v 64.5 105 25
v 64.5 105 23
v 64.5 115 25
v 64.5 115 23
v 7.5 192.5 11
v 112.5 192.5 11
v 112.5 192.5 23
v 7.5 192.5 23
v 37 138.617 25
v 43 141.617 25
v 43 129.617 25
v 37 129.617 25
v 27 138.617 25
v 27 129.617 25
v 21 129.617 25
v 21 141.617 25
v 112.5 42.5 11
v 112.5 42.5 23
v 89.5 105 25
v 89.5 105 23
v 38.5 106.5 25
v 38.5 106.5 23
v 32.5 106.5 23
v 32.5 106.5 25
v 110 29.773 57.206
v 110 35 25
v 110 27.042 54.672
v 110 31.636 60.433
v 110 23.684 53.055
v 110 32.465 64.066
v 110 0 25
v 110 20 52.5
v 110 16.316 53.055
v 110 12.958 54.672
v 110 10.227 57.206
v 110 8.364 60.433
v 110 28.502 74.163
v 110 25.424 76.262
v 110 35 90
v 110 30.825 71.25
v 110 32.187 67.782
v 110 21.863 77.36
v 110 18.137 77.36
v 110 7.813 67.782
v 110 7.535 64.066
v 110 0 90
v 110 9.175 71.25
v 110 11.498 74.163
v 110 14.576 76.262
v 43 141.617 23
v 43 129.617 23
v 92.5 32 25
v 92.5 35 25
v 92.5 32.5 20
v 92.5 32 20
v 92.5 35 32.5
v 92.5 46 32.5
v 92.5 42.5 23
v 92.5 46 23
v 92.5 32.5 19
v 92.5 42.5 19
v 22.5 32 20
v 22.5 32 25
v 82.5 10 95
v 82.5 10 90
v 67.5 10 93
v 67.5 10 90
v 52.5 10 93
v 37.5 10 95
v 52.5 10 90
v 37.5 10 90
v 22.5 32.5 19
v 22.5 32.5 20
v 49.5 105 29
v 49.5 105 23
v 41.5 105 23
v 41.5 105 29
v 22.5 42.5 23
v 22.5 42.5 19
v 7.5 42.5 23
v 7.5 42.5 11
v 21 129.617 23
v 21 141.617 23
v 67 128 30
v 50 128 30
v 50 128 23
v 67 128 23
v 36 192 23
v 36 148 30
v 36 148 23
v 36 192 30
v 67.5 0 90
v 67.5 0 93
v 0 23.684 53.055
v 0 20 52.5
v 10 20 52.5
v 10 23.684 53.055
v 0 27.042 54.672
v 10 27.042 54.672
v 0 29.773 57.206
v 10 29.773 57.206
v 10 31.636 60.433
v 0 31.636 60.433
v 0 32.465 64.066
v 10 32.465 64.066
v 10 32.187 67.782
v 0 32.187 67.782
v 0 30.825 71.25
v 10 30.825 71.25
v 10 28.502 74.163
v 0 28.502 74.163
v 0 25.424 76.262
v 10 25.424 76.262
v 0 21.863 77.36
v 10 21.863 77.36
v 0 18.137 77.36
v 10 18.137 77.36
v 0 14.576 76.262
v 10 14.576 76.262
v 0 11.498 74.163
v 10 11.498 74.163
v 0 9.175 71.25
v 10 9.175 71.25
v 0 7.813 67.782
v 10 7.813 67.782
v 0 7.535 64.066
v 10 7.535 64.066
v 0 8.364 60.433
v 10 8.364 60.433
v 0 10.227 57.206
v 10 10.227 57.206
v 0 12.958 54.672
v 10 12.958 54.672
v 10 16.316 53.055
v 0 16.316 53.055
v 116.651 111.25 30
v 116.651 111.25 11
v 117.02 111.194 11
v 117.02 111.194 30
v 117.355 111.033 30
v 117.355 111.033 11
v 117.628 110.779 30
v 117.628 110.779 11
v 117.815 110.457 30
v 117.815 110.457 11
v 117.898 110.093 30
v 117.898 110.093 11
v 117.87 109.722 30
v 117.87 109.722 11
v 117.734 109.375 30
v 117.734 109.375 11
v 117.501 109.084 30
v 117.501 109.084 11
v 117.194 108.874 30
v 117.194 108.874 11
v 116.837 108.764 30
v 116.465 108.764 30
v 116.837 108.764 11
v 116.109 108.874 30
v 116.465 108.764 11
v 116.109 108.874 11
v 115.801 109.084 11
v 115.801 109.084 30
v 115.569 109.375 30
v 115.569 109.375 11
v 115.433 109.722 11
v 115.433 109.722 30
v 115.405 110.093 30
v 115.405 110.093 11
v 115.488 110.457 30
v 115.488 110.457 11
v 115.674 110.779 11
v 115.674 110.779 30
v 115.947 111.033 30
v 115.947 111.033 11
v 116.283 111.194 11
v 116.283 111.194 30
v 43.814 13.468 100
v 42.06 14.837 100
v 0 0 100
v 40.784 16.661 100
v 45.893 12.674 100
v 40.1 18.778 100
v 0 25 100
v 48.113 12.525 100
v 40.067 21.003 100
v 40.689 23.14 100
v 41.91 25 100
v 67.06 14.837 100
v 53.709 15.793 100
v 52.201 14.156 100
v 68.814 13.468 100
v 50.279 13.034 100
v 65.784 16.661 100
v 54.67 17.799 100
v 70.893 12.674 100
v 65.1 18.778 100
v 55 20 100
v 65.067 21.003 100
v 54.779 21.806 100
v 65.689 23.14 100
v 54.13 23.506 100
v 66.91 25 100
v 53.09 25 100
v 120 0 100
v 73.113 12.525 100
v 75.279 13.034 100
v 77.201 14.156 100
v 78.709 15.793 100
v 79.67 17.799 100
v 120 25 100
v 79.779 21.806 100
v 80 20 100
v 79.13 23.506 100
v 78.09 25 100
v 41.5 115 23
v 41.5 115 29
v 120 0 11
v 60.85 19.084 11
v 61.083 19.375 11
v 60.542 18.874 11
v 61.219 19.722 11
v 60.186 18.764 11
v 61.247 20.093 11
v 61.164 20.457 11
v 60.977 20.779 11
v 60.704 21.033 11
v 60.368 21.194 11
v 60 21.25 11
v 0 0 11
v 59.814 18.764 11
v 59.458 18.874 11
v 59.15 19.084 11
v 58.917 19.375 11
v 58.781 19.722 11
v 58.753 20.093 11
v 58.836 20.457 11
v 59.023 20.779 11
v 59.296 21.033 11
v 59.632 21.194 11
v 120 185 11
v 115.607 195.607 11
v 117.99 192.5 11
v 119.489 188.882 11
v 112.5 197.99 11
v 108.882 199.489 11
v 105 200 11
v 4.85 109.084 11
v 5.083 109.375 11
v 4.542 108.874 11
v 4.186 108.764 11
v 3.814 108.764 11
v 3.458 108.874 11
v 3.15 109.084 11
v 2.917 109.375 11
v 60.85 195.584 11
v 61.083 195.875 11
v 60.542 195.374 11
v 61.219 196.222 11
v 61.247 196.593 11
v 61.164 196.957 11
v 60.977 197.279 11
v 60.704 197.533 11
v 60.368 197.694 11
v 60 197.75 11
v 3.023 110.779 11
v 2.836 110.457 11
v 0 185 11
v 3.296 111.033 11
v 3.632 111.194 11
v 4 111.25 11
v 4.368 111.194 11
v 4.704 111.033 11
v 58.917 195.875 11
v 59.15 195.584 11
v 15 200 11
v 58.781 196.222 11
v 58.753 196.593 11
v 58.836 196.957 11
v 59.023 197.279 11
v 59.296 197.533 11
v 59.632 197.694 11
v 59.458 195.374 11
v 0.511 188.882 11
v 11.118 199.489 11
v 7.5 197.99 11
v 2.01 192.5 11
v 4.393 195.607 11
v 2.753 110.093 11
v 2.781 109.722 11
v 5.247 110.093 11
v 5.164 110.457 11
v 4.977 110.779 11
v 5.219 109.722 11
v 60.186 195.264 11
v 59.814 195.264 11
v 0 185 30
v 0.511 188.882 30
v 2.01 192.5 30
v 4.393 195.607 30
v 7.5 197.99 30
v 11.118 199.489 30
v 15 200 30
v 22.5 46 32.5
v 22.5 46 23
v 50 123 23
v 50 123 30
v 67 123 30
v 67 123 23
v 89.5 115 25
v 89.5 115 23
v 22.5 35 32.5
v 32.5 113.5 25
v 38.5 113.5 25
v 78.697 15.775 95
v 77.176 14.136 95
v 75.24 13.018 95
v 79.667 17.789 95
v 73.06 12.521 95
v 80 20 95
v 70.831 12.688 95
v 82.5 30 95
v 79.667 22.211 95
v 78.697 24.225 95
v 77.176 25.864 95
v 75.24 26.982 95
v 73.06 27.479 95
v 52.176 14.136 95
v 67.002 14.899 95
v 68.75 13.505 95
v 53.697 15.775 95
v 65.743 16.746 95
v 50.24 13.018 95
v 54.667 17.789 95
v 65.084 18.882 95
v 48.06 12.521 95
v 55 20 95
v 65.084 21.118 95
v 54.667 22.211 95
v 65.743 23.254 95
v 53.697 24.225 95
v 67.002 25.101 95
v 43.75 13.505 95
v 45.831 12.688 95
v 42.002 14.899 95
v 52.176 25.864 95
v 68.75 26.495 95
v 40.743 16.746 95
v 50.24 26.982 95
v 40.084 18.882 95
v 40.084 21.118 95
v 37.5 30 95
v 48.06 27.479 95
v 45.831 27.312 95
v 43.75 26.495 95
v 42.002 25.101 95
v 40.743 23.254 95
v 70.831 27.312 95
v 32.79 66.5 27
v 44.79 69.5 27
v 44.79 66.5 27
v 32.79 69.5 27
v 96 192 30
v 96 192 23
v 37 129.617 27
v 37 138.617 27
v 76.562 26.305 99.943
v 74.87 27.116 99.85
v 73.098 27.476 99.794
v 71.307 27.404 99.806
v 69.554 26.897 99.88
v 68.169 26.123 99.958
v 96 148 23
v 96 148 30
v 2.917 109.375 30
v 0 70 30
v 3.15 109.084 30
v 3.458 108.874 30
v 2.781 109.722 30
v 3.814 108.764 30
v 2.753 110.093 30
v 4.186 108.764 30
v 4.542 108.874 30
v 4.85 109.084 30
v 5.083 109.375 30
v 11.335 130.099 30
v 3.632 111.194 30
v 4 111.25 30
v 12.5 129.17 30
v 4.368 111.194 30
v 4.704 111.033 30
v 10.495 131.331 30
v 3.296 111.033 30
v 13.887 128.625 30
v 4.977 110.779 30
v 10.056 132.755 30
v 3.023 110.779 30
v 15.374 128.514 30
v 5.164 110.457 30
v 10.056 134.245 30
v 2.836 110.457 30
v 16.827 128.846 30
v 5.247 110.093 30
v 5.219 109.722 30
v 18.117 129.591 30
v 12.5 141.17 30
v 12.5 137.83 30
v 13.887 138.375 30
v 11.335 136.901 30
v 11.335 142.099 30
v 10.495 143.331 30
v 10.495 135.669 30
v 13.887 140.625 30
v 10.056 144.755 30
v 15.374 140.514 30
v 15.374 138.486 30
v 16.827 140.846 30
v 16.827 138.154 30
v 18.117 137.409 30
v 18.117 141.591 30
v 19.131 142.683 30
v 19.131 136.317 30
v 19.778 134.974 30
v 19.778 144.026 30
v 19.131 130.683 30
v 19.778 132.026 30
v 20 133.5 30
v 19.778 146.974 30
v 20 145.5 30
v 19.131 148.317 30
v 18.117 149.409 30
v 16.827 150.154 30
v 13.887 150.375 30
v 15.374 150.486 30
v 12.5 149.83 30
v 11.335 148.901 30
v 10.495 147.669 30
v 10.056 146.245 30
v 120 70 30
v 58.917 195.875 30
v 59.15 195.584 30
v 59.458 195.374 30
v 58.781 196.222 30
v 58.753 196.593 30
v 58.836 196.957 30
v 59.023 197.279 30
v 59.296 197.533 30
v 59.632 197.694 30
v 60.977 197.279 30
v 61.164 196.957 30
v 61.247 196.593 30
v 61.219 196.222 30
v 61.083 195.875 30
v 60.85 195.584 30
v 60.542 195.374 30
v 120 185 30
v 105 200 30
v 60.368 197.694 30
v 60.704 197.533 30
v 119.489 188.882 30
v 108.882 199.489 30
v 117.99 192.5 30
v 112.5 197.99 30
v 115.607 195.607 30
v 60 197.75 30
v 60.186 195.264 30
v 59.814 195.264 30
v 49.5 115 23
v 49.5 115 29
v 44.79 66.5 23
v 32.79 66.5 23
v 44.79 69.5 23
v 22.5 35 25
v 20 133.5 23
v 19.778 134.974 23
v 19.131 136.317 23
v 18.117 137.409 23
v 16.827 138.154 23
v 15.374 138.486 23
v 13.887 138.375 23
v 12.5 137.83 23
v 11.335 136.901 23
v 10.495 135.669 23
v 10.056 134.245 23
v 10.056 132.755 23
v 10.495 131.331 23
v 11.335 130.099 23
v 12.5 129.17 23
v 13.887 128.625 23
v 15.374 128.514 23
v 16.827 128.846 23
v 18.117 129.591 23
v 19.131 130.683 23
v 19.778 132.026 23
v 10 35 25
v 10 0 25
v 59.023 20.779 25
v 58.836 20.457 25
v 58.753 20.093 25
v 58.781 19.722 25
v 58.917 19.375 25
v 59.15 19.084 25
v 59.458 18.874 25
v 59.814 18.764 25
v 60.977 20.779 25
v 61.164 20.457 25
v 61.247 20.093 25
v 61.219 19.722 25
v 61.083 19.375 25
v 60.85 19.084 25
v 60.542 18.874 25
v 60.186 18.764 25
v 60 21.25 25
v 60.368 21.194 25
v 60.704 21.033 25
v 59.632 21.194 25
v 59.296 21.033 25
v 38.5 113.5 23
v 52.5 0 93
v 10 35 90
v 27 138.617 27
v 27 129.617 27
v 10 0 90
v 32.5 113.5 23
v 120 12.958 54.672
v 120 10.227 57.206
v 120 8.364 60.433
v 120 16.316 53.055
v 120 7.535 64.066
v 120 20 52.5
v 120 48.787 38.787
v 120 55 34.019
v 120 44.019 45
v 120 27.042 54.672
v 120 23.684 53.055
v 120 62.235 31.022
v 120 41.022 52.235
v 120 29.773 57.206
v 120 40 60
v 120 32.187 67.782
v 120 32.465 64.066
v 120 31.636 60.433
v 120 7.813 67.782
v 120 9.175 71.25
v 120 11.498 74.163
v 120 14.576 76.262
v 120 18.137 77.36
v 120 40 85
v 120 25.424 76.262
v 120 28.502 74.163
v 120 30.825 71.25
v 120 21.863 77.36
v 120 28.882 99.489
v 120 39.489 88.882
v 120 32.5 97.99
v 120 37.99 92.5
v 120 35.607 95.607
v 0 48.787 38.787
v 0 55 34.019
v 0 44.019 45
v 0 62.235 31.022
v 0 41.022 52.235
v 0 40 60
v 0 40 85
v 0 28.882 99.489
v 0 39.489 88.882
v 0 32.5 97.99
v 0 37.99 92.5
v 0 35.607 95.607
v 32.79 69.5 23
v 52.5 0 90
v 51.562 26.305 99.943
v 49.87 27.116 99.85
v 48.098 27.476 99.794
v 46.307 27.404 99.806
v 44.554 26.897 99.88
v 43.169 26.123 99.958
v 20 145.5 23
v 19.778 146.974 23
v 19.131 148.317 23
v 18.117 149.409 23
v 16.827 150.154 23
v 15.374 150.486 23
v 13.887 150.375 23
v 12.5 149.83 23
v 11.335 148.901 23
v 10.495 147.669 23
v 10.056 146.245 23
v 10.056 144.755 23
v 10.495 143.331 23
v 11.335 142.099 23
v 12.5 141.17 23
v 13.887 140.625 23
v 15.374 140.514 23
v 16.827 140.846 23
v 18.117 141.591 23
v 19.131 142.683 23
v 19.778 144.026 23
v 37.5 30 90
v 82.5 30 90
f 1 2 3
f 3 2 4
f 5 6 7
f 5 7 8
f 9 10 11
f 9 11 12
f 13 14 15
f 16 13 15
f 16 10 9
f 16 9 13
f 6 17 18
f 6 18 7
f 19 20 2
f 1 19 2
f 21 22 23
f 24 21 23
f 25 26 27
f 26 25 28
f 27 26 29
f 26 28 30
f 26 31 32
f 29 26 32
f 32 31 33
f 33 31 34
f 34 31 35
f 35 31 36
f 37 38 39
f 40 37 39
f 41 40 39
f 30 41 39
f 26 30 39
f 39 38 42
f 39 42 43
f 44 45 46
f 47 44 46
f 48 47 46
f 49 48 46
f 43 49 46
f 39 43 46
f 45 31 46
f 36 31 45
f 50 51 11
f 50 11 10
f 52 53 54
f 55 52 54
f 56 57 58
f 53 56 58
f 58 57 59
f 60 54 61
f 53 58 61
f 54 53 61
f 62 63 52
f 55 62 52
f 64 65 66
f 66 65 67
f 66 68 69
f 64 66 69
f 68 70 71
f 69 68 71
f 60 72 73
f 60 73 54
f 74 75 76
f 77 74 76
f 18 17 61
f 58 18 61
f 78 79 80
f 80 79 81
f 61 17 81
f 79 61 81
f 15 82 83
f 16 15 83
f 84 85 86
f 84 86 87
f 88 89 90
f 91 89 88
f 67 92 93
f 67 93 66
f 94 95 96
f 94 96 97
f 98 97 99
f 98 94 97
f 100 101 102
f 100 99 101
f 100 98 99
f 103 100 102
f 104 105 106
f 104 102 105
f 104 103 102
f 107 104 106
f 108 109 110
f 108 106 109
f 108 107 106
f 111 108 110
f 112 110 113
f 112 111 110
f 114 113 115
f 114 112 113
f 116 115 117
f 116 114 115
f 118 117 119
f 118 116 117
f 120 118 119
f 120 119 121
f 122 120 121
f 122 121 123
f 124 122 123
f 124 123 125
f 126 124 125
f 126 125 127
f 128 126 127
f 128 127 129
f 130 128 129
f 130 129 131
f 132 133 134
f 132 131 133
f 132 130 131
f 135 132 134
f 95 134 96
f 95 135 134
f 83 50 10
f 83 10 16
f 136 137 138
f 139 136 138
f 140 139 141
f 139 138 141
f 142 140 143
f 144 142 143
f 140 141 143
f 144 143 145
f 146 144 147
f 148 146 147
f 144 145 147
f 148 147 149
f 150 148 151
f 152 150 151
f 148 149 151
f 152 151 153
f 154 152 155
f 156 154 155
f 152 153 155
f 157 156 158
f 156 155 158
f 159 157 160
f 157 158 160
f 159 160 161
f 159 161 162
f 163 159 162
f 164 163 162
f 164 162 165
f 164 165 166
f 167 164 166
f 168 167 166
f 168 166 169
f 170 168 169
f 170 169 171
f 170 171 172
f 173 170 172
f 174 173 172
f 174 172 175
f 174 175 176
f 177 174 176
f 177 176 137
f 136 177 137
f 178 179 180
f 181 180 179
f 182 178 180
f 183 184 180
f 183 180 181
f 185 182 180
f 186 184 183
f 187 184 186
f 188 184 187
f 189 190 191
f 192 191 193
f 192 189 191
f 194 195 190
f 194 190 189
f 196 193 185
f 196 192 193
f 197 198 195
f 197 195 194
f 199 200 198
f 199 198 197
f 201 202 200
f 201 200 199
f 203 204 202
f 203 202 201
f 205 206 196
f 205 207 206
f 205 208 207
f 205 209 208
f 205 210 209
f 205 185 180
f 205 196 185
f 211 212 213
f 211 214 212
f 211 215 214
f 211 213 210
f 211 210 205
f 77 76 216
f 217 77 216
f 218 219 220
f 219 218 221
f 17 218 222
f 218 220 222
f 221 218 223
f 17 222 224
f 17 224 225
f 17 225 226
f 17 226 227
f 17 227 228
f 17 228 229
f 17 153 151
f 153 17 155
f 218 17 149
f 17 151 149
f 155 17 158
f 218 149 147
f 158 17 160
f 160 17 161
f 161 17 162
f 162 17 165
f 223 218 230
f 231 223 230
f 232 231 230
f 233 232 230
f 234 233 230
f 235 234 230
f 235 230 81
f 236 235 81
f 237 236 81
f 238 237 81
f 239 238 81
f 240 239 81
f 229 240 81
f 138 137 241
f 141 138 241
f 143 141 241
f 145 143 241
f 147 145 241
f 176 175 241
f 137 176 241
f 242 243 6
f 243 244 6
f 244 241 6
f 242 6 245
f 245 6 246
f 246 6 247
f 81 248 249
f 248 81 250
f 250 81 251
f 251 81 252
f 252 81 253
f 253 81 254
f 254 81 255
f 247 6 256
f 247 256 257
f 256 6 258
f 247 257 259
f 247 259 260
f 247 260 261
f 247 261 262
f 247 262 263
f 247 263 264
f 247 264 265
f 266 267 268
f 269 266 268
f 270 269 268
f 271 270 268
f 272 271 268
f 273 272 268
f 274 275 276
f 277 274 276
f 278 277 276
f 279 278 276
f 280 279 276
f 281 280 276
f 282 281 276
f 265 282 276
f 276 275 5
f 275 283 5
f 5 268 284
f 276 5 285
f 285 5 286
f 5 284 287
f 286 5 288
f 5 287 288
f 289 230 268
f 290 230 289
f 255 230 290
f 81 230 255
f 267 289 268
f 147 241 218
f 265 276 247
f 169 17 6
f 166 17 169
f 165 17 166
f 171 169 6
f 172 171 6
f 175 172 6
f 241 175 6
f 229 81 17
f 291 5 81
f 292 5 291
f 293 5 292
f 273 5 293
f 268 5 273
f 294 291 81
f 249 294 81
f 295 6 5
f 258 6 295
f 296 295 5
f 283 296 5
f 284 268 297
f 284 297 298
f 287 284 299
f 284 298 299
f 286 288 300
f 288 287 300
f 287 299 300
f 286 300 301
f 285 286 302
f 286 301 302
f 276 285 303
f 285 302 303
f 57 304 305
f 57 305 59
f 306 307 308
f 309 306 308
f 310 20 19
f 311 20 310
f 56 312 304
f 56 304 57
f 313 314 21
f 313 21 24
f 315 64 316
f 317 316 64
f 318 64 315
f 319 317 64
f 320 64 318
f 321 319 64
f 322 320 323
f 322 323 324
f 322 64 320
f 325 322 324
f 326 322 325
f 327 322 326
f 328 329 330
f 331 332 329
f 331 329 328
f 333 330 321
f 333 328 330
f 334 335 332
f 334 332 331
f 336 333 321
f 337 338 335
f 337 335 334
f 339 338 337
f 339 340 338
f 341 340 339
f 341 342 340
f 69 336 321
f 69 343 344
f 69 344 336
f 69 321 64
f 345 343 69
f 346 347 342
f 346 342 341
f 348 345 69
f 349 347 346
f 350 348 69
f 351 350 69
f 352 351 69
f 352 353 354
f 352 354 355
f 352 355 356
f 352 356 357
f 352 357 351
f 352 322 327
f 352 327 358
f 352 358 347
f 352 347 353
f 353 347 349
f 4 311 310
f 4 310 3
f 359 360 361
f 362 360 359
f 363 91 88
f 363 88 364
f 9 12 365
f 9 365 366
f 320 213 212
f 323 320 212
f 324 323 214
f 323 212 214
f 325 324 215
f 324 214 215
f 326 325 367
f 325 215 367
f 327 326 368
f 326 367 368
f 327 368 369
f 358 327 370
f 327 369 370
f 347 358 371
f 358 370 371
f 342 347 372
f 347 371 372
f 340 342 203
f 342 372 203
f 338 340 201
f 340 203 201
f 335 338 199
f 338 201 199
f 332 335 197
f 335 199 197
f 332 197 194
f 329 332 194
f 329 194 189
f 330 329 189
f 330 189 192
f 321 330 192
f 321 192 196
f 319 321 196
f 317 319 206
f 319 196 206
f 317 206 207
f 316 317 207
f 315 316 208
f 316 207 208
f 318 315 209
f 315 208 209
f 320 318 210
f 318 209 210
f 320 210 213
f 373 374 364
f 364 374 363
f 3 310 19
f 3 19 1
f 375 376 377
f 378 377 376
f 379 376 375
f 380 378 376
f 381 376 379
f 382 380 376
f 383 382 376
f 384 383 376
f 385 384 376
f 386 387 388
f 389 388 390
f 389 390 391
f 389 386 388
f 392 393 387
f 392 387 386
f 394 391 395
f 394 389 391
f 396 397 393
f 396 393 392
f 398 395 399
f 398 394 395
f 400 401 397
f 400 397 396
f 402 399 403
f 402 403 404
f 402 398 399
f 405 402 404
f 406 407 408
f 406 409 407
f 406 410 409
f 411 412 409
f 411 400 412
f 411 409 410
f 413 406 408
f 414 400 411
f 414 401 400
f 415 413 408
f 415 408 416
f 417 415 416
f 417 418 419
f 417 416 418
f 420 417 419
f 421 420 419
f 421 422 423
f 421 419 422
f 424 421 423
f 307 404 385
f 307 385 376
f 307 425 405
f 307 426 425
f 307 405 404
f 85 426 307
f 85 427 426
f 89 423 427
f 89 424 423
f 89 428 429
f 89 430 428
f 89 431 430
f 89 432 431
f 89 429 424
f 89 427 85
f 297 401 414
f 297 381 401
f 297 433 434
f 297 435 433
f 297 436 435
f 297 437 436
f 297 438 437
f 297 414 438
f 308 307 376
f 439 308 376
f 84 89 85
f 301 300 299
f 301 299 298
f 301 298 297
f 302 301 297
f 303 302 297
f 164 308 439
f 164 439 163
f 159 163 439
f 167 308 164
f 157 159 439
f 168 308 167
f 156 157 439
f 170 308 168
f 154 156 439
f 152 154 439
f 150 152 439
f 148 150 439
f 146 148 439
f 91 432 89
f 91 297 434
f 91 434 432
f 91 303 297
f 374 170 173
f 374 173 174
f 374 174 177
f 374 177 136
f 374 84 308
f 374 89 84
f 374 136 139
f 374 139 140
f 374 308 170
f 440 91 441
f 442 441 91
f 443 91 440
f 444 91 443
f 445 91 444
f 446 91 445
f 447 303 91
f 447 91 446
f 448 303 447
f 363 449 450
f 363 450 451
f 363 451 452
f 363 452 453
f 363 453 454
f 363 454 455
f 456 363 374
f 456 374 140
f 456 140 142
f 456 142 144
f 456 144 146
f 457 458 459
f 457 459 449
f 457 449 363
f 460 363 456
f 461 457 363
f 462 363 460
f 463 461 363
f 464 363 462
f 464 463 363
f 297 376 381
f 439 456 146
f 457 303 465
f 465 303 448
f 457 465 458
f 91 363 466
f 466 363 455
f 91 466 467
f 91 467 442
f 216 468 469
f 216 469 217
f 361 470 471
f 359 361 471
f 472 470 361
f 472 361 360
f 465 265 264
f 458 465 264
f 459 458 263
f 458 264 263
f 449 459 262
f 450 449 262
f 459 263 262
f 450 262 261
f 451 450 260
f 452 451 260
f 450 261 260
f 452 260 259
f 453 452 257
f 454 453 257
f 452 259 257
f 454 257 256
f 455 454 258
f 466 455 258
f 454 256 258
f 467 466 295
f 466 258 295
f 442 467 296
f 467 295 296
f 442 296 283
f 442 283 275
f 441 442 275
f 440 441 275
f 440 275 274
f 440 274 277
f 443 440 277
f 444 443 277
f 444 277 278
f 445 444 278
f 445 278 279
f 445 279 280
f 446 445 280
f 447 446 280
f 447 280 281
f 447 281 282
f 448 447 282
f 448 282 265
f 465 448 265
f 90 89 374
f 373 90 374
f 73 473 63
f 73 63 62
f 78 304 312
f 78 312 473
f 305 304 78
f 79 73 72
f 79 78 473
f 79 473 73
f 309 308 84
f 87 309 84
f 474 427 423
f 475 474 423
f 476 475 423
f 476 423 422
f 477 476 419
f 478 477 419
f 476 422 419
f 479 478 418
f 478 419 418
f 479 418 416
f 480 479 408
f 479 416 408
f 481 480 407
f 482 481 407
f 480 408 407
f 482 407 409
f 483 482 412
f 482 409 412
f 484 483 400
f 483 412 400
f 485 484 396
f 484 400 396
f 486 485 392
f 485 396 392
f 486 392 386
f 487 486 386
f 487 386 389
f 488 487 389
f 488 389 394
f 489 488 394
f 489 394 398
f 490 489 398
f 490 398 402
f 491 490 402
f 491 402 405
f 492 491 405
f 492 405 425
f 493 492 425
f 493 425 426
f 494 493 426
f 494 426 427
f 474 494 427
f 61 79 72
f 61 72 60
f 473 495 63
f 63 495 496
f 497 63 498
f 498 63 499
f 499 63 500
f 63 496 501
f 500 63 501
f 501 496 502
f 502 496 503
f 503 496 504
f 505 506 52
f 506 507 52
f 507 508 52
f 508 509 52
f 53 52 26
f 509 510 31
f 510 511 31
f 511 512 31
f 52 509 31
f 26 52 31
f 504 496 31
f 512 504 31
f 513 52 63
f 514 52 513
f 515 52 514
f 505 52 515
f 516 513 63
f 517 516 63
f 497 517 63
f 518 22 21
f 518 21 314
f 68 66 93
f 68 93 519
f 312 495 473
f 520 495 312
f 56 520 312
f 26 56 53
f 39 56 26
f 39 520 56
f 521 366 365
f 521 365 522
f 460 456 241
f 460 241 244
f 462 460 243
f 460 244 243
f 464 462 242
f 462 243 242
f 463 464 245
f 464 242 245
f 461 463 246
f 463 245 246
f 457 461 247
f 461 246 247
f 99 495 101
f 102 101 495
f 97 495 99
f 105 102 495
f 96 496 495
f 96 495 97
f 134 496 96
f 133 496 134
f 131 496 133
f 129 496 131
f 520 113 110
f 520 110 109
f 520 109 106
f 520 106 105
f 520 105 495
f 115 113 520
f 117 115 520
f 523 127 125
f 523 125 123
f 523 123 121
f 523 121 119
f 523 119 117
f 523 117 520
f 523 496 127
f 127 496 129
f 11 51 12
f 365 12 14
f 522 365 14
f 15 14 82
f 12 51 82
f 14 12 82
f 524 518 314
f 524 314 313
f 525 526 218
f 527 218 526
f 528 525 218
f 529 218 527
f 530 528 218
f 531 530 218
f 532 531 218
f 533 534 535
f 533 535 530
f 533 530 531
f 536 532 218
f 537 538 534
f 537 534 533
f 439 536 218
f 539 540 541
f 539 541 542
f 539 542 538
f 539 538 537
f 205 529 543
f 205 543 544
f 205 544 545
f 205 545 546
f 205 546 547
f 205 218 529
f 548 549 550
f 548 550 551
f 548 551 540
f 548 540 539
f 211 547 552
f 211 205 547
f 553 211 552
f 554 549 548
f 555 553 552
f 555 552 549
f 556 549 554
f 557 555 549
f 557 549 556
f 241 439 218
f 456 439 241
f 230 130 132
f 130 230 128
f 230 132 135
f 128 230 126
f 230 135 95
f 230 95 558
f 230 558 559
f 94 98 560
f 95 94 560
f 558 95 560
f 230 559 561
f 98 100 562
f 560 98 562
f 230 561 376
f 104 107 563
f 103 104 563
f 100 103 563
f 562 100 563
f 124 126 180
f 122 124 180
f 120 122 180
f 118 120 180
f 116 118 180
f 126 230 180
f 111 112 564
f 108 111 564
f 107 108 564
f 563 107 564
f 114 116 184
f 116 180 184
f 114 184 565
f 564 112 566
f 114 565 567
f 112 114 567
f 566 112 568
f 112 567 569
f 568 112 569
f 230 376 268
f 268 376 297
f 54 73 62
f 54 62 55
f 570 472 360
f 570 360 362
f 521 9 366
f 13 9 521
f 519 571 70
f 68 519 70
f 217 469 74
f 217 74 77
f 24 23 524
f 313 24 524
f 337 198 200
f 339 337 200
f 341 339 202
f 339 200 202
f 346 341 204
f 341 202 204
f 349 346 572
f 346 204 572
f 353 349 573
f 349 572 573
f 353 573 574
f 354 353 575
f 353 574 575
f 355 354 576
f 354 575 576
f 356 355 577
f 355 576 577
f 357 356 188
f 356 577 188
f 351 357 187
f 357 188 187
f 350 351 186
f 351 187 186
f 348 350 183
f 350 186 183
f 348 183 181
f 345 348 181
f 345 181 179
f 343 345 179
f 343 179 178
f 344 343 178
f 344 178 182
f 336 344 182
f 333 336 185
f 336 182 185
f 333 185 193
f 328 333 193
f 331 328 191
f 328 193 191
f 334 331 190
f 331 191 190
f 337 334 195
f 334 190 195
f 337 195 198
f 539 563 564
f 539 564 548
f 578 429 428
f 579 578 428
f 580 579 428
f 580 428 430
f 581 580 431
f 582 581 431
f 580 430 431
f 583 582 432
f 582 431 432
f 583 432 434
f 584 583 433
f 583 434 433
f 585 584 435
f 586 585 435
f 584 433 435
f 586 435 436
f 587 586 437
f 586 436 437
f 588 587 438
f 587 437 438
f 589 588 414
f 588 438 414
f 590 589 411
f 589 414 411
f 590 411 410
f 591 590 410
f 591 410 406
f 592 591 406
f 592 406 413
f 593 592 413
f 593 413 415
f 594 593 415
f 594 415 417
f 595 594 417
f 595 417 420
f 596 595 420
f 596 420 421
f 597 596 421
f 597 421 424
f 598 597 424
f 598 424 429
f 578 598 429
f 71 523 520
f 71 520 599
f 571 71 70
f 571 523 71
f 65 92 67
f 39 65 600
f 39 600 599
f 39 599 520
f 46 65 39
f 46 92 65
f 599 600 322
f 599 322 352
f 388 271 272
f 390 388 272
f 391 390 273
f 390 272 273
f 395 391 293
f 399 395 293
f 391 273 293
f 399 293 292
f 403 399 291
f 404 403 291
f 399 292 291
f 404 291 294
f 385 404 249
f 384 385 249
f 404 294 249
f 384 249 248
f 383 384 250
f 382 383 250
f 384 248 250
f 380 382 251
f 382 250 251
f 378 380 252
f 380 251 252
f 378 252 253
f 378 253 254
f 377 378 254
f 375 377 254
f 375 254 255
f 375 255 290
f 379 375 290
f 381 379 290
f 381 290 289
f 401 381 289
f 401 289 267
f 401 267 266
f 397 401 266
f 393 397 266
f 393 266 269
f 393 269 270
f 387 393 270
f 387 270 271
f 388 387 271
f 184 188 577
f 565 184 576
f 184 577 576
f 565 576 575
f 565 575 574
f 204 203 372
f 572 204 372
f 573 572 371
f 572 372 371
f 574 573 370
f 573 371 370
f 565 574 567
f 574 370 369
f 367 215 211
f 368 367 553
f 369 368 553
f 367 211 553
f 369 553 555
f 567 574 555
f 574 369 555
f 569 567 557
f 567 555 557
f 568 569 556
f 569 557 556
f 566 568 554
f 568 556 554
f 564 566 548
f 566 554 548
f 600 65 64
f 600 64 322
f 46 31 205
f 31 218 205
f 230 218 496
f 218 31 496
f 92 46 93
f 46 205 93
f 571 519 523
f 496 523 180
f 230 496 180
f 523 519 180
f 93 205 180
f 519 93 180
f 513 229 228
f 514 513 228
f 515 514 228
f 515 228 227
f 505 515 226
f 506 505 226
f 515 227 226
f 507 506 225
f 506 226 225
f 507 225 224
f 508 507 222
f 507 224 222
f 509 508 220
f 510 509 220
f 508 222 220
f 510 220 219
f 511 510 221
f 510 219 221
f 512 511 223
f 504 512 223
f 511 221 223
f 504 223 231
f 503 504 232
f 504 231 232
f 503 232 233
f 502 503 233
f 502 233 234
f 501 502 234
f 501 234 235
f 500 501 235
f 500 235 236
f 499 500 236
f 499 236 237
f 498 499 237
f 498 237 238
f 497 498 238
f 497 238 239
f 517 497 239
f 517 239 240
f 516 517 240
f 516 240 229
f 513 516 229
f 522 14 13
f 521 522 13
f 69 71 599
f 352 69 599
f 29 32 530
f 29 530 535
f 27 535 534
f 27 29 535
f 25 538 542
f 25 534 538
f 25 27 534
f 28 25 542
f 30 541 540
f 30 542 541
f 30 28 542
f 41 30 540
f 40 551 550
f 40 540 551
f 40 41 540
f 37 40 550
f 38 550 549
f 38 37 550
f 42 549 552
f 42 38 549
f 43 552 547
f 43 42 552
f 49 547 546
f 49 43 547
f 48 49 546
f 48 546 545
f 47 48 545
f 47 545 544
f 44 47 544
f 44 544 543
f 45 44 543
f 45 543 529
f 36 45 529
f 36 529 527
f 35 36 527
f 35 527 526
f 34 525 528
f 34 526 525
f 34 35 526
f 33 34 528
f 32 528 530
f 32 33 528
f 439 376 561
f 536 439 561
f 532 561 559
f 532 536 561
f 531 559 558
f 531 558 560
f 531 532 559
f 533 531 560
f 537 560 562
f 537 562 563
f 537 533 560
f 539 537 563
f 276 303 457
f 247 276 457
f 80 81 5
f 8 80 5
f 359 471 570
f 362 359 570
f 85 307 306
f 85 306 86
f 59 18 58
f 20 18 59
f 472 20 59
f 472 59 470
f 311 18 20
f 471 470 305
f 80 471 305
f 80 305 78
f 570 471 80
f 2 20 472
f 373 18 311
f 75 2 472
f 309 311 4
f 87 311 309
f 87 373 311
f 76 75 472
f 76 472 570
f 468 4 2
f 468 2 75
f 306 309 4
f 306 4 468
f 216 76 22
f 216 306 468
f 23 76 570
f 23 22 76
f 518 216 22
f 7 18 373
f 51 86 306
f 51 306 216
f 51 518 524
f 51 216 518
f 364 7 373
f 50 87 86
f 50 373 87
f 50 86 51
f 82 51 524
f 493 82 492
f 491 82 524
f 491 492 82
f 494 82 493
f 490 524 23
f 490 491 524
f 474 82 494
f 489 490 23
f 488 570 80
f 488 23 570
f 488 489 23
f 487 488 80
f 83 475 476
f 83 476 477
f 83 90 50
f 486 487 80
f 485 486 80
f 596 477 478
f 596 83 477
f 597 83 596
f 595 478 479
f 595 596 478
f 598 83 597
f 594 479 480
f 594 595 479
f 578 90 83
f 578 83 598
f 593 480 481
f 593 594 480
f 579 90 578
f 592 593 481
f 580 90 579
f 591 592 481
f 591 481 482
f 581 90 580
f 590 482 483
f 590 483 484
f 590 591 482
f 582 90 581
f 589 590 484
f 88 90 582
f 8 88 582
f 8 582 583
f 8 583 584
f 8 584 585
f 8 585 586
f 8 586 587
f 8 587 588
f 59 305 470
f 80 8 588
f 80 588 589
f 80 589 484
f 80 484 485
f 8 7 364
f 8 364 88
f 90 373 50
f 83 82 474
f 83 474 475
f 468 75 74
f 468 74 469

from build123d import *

# Parameters (mm, degrees)
ESQUISSE1_W                  = 120
ESQUISSE1_H                  = 200
BOSS_EXTRU_2_DEPTH           = 30
ESQUISSE3_W                  = 120
ESQUISSE3_H                  = 40
BOSS_EXTRU_3_DEPTH           = 70
CONG_1_R                     = 30
ESQUISSE4_W                  = 120
ESQUISSE4_H                  = 40
BOSS_EXTRU_4_DEPTH           = 140
CONG_2_R                     = 15
ESQUISSE5_W                  = 50
ESQUISSE5_H                  = 30
BOSS_EXTRU_9_DEPTH           = 7.5
ESQUISSE7_W                  = 100
ESQUISSE7_H                  = 65
ENL_V_MAT_EXTRU_1_DEPTH      = 35
ENL_V_MAT_EXTRU_7_REACH      = 358.791
ESQUISSE8_R                  = 7.5
ESQUISSE12_W                 = 45
ESQUISSE12_H                 = 20
ENL_V_MAT_EXTRU_8_DEPTH      = 5
ENL_V_MAT_EXTRU_9_DEPTH      = 289.617393793
ENL_V_MAT_EXTRU_9_DEPTH_BACK = 289.617393793
ESQUISSE13_R                 = 12.5
ESQUISSE14_W                 = 15
ESQUISSE14_H                 = 10
ENL_V_MAT_EXTRU_10_DEPTH     = 3
ESQUISSE20_W                 = 142.524843465
ESQUISSE20_H                 = 215.321289932
ENL_V_MAT_EXTRU_11_DEPTH     = 192
ESQUISSE21_W                 = 105
ESQUISSE21_H                 = 150
ENL_V_MAT_EXTRU_12_DEPTH     = 10
ENL_V_MAT_EXTRU_13_REACH     = 245.516
ESQUISSE22_W                 = 60
ESQUISSE22_H                 = 44
ENL_V_MAT_EXTRU_14_REACH     = 245.516
ESQUISSE23_W                 = 17
ESQUISSE23_H                 = 5
ENL_V_MAT_EXTRU_15_REACH     = 245.516
ESQUISSE24_R                 = 5
ESQUISSE25_W                 = 60
ESQUISSE25_H                 = 25
ENL_V_MAT_EXTRU_16_DEPTH     = 5
CONG_3_R                     = 15
ESQUISSE27_W                 = 76
ESQUISSE27_H                 = 44
ENL_V_MAT_EXTRU_18_DEPTH     = 13
ESQUISSE21_2_W               = 105
ESQUISSE21_2_H               = 150
ENL_V_MAT_EXTRU_20_DEPTH     = 20
ESQUISSE21_3_W               = 105
ESQUISSE21_3_H               = 150
ENL_V_MAT_EXTRU_21_DEPTH     = 22
ESQUISSE21_4_W               = 105
ESQUISSE21_4_H               = 150
ENL_V_MAT_EXTRU_22_DEPTH     = 23
ESQUISSE30_W                 = 70
ESQUISSE30_H                 = 7.5
ENL_V_MAT_EXTRU_23_DEPTH     = 11
ESQUISSE31_W                 = 11
ESQUISSE31_H                 = 200
ENL_V_MAT_EXTRU_24_DEPTH     = 254.771550896
ESQUISSE32_W                 = 6
ESQUISSE32_H                 = 7
ENL_V_MAT_EXTRU_25_DEPTH     = 2
ESQUISSE33_W                 = 8
ESQUISSE33_H                 = 10
ENL_V_MAT_EXTRU_26_DEPTH     = 6
ESQUISSE35_W                 = 22
ESQUISSE35_H                 = 12
ENL_V_MAT_EXTRU_27_DEPTH     = 2
ESQUISSE36_W                 = 10
ESQUISSE36_H                 = 9
ENL_V_MAT_EXTRU_28_DEPTH     = 4
ESQUISSE37_W                 = 25
ESQUISSE37_H                 = 10
ENL_V_MAT_EXTRU_29_DEPTH     = 2
ESQUISSE38_W                 = 12
ESQUISSE38_H                 = 3
ENL_V_MAT_EXTRU_30_DEPTH     = 4
ESQUISSE39_W                 = 70
ESQUISSE39_H                 = 4
ENL_V_MAT_EXTRU_31_DEPTH     = 10
ESQUISSE40_W                 = 70
ESQUISSE40_H                 = 14
ENL_V_MAT_EXTRU_32_DEPTH     = 5
ESQUISSE41_R                 = 1.25
ENL_V_MAT_EXTRU_33_DEPTH     = 15
ESQUISSE42_R                 = 1.25
ENL_V_MAT_EXTRU_34_DEPTH     = 250.641743388


with BuildPart() as part:
    # Esquisse1 → Boss.-Extru.2 (new, symmetric)
    with BuildSketch(Plane.XY):
        with Locations((60, 100)):
            Rectangle(ESQUISSE1_W, ESQUISSE1_H)
    extrude(amount=BOSS_EXTRU_2_DEPTH, both=True)

    # Esquisse3 → Boss.-Extru.3 (add)
    with BuildSketch(Plane.XY.offset(30)):
        with Locations((60, 20)):
            Rectangle(ESQUISSE3_W, ESQUISSE3_H)
    extrude(amount=BOSS_EXTRU_3_DEPTH)

    # Congé1
    cong_1_edges = [part.edges().sort_by_distance(p)[0] for p in [
        (60, 40, 30),
    ]]
    fillet(cong_1_edges, radius=CONG_1_R)

    # Esquisse4 → Boss.-Extru.4 (add)
    with BuildSketch(Plane(origin=(0, 0, -30), x_dir=(-1, 0, 0), z_dir=(0, 0, -1))):
        with Locations((-60, 20)):
            Rectangle(ESQUISSE4_W, ESQUISSE4_H)
    extrude(amount=BOSS_EXTRU_4_DEPTH)

    # Congé2
    cong_2_edges = [part.edges().sort_by_distance(p)[0] for p in [
        (60, 40, -30),
    ]]
    fillet(cong_2_edges, radius=CONG_2_R)

    # Esquisse5 → Boss.-Extru.9 (add)
    with BuildSketch(Plane.XY.offset(100)):
        with Locations((60, 20)):
            Rectangle(ESQUISSE5_W, ESQUISSE5_H)
    extrude(amount=-BOSS_EXTRU_9_DEPTH)

    # Esquisse7 → Enlèv. mat.-Extru.1 (cut)
    with BuildSketch(Plane.XZ):
        with Locations((60, 57.5)):
            Rectangle(ESQUISSE7_W, ESQUISSE7_H)
    extrude(amount=-ENL_V_MAT_EXTRU_1_DEPTH, mode=Mode.SUBTRACT)

    # Esquisse8 → Enlèv. mat.-Extru.7 (cut, up to next)
    with BuildSketch(Plane.XY.offset(100), mode=Mode.PRIVATE) as enl_v_mat_extru_7_sk1:
        with Locations((47.5, 20)):
            Circle(ESQUISSE8_R)
    enl_v_mat_extru_7_tool1 = extrude(enl_v_mat_extru_7_sk1.sketch, amount=-ENL_V_MAT_EXTRU_7_REACH, mode=Mode.PRIVATE) & part.part
    # Esquisse8 → Enlèv. mat.-Extru.7 (cut, up to next)
    with BuildSketch(Plane.XY.offset(100), mode=Mode.PRIVATE) as enl_v_mat_extru_7_sk2:
        with Locations((72.5, 20)):
            Circle(ESQUISSE8_R)
    enl_v_mat_extru_7_tool2 = extrude(enl_v_mat_extru_7_sk2.sketch, amount=-ENL_V_MAT_EXTRU_7_REACH, mode=Mode.PRIVATE) & part.part
    add(enl_v_mat_extru_7_tool1.solids().sort_by_distance((47.5, 20, 100))[0], mode=Mode.SUBTRACT)
    add(enl_v_mat_extru_7_tool2.solids().sort_by_distance((72.5, 20, 100))[0], mode=Mode.SUBTRACT)

    # Esquisse12 → Enlèv. mat.-Extru.8 (cut)
    with BuildSketch(Plane(origin=(0, 0, 90), x_dir=(-1, 0, 0), z_dir=(0, 0, -1))):
        with Locations((-60, 20)):
            Rectangle(ESQUISSE12_W, ESQUISSE12_H)
    extrude(amount=-ENL_V_MAT_EXTRU_8_DEPTH, mode=Mode.SUBTRACT)

    # Esquisse13 → Enlèv. mat.-Extru.9 (cut, two sides: drawn at the far end of the back side and taken through both)
    with BuildSketch(Plane(origin=(120, 0, 0), x_dir=(0, 0, -1), z_dir=(1, 0, 0)).offset(-ENL_V_MAT_EXTRU_9_DEPTH_BACK)):
        with Locations((-65, 20)):
            Circle(ESQUISSE13_R)
    extrude(amount=ENL_V_MAT_EXTRU_9_DEPTH + ENL_V_MAT_EXTRU_9_DEPTH_BACK, mode=Mode.SUBTRACT)

    # Esquisse14 → Enlèv. mat.-Extru.10 (cut)
    with BuildSketch(Plane(origin=(0, 0, 90), x_dir=(-1, 0, 0), z_dir=(0, 0, -1))):
        with Locations((-60, 5)):
            Rectangle(ESQUISSE14_W, ESQUISSE14_H)
    extrude(amount=-ENL_V_MAT_EXTRU_10_DEPTH, mode=Mode.SUBTRACT)

    # Esquisse20 → Enlèv. mat.-Extru.11 (cut)
    with BuildSketch(Plane.XY):
        with Locations((67.67012367, 99.581629618)):
            Rectangle(ESQUISSE20_W, ESQUISSE20_H)
    extrude(amount=-ENL_V_MAT_EXTRU_11_DEPTH, mode=Mode.SUBTRACT)

    # Esquisse21 → Enlèv. mat.-Extru.12 (cut)
    with BuildSketch(Plane(origin=(0, 0, 0), x_dir=(-1, 0, 0), z_dir=(0, 0, -1))):
        with Locations((-60, 117.5)):
            Rectangle(ESQUISSE21_W, ESQUISSE21_H)
    extrude(amount=-ENL_V_MAT_EXTRU_12_DEPTH, mode=Mode.SUBTRACT)

    # Esquisse22 → Enlèv. mat.-Extru.13 (cut, up to next)
    with BuildSketch(Plane.XY.offset(30), mode=Mode.PRIVATE) as enl_v_mat_extru_13_sk1:
        with Locations((66, 170)):
            Rectangle(ESQUISSE22_W, ESQUISSE22_H)
    enl_v_mat_extru_13_tool1 = extrude(enl_v_mat_extru_13_sk1.sketch, amount=-ENL_V_MAT_EXTRU_13_REACH, mode=Mode.PRIVATE) & part.part
    add(enl_v_mat_extru_13_tool1.solids().sort_by_distance((66, 170, 30))[0], mode=Mode.SUBTRACT)

    # Esquisse23 → Enlèv. mat.-Extru.14 (cut, up to next)
    with BuildSketch(Plane.XY.offset(30), mode=Mode.PRIVATE) as enl_v_mat_extru_14_sk1:
        with Locations((58.5, 125.5)):
            Rectangle(ESQUISSE23_W, ESQUISSE23_H)
    enl_v_mat_extru_14_tool1 = extrude(enl_v_mat_extru_14_sk1.sketch, amount=-ENL_V_MAT_EXTRU_14_REACH, mode=Mode.PRIVATE) & part.part
    add(enl_v_mat_extru_14_tool1.solids().sort_by_distance((58.5, 125.5, 30))[0], mode=Mode.SUBTRACT)

    # Esquisse24 → Enlèv. mat.-Extru.15 (cut, up to next)
    with BuildSketch(Plane.XY.offset(30), mode=Mode.PRIVATE) as enl_v_mat_extru_15_sk1:
        with Locations((15, 145.5)):
            Circle(ESQUISSE24_R)
    enl_v_mat_extru_15_tool1 = extrude(enl_v_mat_extru_15_sk1.sketch, amount=-ENL_V_MAT_EXTRU_15_REACH, mode=Mode.PRIVATE) & part.part
    # Esquisse24 → Enlèv. mat.-Extru.15 (cut, up to next)
    with BuildSketch(Plane.XY.offset(30), mode=Mode.PRIVATE) as enl_v_mat_extru_15_sk2:
        with Locations((15, 133.5)):
            Circle(ESQUISSE24_R)
    enl_v_mat_extru_15_tool2 = extrude(enl_v_mat_extru_15_sk2.sketch, amount=-ENL_V_MAT_EXTRU_15_REACH, mode=Mode.PRIVATE) & part.part
    add(enl_v_mat_extru_15_tool1.solids().sort_by_distance((15, 145.5, 30))[0], mode=Mode.SUBTRACT)
    add(enl_v_mat_extru_15_tool2.solids().sort_by_distance((15, 133.5, 30))[0], mode=Mode.SUBTRACT)

    # Esquisse25 → Enlèv. mat.-Extru.16 (cut)
    with BuildSketch(Plane(origin=(0, 0, 10), x_dir=(-1, 0, 0), z_dir=(0, 0, -1))):
        with Locations((-62.5, 95.5)):
            Rectangle(ESQUISSE25_W, ESQUISSE25_H)
    extrude(amount=-ENL_V_MAT_EXTRU_16_DEPTH, mode=Mode.SUBTRACT)

    # Congé3
    # the kernel refuses this fillet: 15 mm, written as the material it takes off along each edge
    with BuildSketch(Plane(origin=(157.5, 40, 100), x_dir=(0, 0, -1), z_dir=(-1, 0, 0))) as cong_3_piece_1:
        with BuildLine():
            CenterArc((CONG_3_R, CONG_3_R), CONG_3_R, 180, 90)
            Line((0, CONG_3_R), (0, 0))
            Line((0, 0), (CONG_3_R, 0))
        make_face()
    extrude(amount=195, mode=Mode.SUBTRACT)
    with BuildSketch(Plane(origin=(0, 200, 67.5), x_dir=(0, -1, 0), z_dir=(0, 0, -1))) as cong_3_piece_2:
        with BuildLine():
            CenterArc((CONG_3_R, -CONG_3_R), CONG_3_R, 90, 90)
            Line((0, -CONG_3_R), (0, 0))
            Line((0, 0), (CONG_3_R, 0))
        make_face()
    extrude(amount=105, mode=Mode.SUBTRACT)
    with BuildSketch(Plane(origin=(120, 200, -37.5), x_dir=(-1, 0, 0), z_dir=(0, 0, 1))) as cong_3_piece_3:
        with BuildLine():
            CenterArc((CONG_3_R, CONG_3_R), CONG_3_R, 180, 90)
            Line((0, CONG_3_R), (0, 0))
            Line((0, 0), (CONG_3_R, 0))
        make_face()
    extrude(amount=105, mode=Mode.SUBTRACT)

    # Esquisse27 → Enlèv. mat.-Extru.18 (cut)
    with BuildSketch(Plane(origin=(0, 0, 10), x_dir=(-1, 0, 0), z_dir=(0, 0, -1))):
        with Locations((-63, 170)):
            Rectangle(ESQUISSE27_W, ESQUISSE27_H)
    extrude(amount=-ENL_V_MAT_EXTRU_18_DEPTH, mode=Mode.SUBTRACT)

    # Esquisse21<2> → Enlèv. mat.-Extru.20 (cut)
    with BuildSketch(Plane(origin=(0, 0, 0), x_dir=(-1, 0, 0), z_dir=(0, 0, -1))):
        with Locations((-60, 117.5)):
            Rectangle(ESQUISSE21_2_W, ESQUISSE21_2_H)
    extrude(amount=-ENL_V_MAT_EXTRU_20_DEPTH, mode=Mode.SUBTRACT)

    # Esquisse21<3> → Enlèv. mat.-Extru.21 (cut)
    with BuildSketch(Plane(origin=(0, 0, 0), x_dir=(-1, 0, 0), z_dir=(0, 0, -1))):
        with Locations((-60, 117.5)):
            Rectangle(ESQUISSE21_3_W, ESQUISSE21_3_H)
    extrude(amount=-ENL_V_MAT_EXTRU_21_DEPTH, mode=Mode.SUBTRACT)

    # Esquisse21<4> → Enlèv. mat.-Extru.22 (cut)
    with BuildSketch(Plane(origin=(0, 0, 0), x_dir=(-1, 0, 0), z_dir=(0, 0, -1))):
        with Locations((-60, 117.5)):
            Rectangle(ESQUISSE21_4_W, ESQUISSE21_4_H)
    extrude(amount=-ENL_V_MAT_EXTRU_22_DEPTH, mode=Mode.SUBTRACT)

    # Esquisse30 → Enlèv. mat.-Extru.23 (cut)
    with BuildSketch(Plane.XZ.offset(-35)):
        with Locations((57.5, 28.75)):
            Rectangle(ESQUISSE30_W, ESQUISSE30_H)
    extrude(amount=-ENL_V_MAT_EXTRU_23_DEPTH, mode=Mode.SUBTRACT)

    # Esquisse31 → Enlèv. mat.-Extru.24 (cut, through all)
    with BuildSketch(Plane(origin=(0, 0, 0), x_dir=(0, 0, -1), z_dir=(1, 0, 0))):
        with Locations((-5.5, 100)):
            Rectangle(ESQUISSE31_W, ESQUISSE31_H)
    extrude(amount=ENL_V_MAT_EXTRU_24_DEPTH, mode=Mode.SUBTRACT)

    # Esquisse32 → Enlèv. mat.-Extru.25 (cut)
    with BuildSketch(Plane(origin=(0, 0, 23), x_dir=(-1, 0, 0), z_dir=(0, 0, -1))):
        with Locations((-35.5, 110)):
            Rectangle(ESQUISSE32_W, ESQUISSE32_H)
    extrude(amount=-ENL_V_MAT_EXTRU_25_DEPTH, mode=Mode.SUBTRACT)

    # Esquisse33 → Enlèv. mat.-Extru.26 (cut)
    with BuildSketch(Plane(origin=(0, 0, 23), x_dir=(-1, 0, 0), z_dir=(0, 0, -1))):
        with Locations((-45.5, 110)):
            Rectangle(ESQUISSE33_W, ESQUISSE33_H)
    extrude(amount=-ENL_V_MAT_EXTRU_26_DEPTH, mode=Mode.SUBTRACT)

    # Esquisse35 → Enlèv. mat.-Extru.27 (cut)
    with BuildSketch(Plane(origin=(0, 0, 23), x_dir=(-1, 0, 0), z_dir=(0, 0, -1))):
        with Locations((-32, 135.617217642)):
            Rectangle(ESQUISSE35_W, ESQUISSE35_H)
    extrude(amount=-ENL_V_MAT_EXTRU_27_DEPTH, mode=Mode.SUBTRACT)

    # Esquisse36 → Enlèv. mat.-Extru.28 (cut)
    with BuildSketch(Plane(origin=(0, 0, 23), x_dir=(-1, 0, 0), z_dir=(0, 0, -1))):
        with Locations((-32, 134.117217642)):
            Rectangle(ESQUISSE36_W, ESQUISSE36_H)
    extrude(amount=-ENL_V_MAT_EXTRU_28_DEPTH, mode=Mode.SUBTRACT)

    # Esquisse37 → Enlèv. mat.-Extru.29 (cut)
    with BuildSketch(Plane(origin=(0, 0, 23), x_dir=(-1, 0, 0), z_dir=(0, 0, -1))):
        with Locations((-77, 110)):
            Rectangle(ESQUISSE37_W, ESQUISSE37_H)
    extrude(amount=-ENL_V_MAT_EXTRU_29_DEPTH, mode=Mode.SUBTRACT)

    # Esquisse38 → Enlèv. mat.-Extru.30 (cut)
    with BuildSketch(Plane(origin=(0, 0, 23), x_dir=(-1, 0, 0), z_dir=(0, 0, -1))):
        with Locations((-38.790269329, 68)):
            Rectangle(ESQUISSE38_W, ESQUISSE38_H)
    extrude(amount=-ENL_V_MAT_EXTRU_30_DEPTH, mode=Mode.SUBTRACT)

    # Esquisse39 → Enlèv. mat.-Extru.31 (cut)
    with BuildSketch(Plane(origin=(0, 42.5, 0), x_dir=(1, 0, 0), z_dir=(0, 1, 0))):
        with Locations((57.5, -21)):
            Rectangle(ESQUISSE39_W, ESQUISSE39_H)
    extrude(amount=-ENL_V_MAT_EXTRU_31_DEPTH, mode=Mode.SUBTRACT)

    # Esquisse40 → Enlèv. mat.-Extru.32 (cut)
    with BuildSketch(Plane.XY.offset(25)):
        with Locations((57.5, 39)):
            Rectangle(ESQUISSE40_W, ESQUISSE40_H)
    extrude(amount=-ENL_V_MAT_EXTRU_32_DEPTH, mode=Mode.SUBTRACT)

    # Esquisse41 → Enlèv. mat.-Extru.33 (cut)
    with BuildSketch(Plane(origin=(0, 0, 11), x_dir=(-1, 0, 0), z_dir=(0, 0, -1))):
        with Locations(Location((-60, 20, 0), (0, 0, 90))):
            Circle(ESQUISSE41_R)
    extrude(amount=-ENL_V_MAT_EXTRU_33_DEPTH, mode=Mode.SUBTRACT)

    # Esquisse42 → Enlèv. mat.-Extru.34 (cut, through all)
    with BuildSketch(Plane(origin=(0, 0, 11), x_dir=(-1, 0, 0), z_dir=(0, 0, -1))):
        with Locations(Location((-116.651195727, 110, 0), (0, 0, 90))):
            Circle(ESQUISSE42_R)
        with Locations(Location((-4, 110, 0), (0, 0, 90))):
            Circle(ESQUISSE42_R)
        with Locations(Location((-60, 196.5, 0), (0, 0, 90))):
            Circle(ESQUISSE42_R)
    extrude(amount=-ENL_V_MAT_EXTRU_34_DEPTH, mode=Mode.SUBTRACT)


solid = part.part
